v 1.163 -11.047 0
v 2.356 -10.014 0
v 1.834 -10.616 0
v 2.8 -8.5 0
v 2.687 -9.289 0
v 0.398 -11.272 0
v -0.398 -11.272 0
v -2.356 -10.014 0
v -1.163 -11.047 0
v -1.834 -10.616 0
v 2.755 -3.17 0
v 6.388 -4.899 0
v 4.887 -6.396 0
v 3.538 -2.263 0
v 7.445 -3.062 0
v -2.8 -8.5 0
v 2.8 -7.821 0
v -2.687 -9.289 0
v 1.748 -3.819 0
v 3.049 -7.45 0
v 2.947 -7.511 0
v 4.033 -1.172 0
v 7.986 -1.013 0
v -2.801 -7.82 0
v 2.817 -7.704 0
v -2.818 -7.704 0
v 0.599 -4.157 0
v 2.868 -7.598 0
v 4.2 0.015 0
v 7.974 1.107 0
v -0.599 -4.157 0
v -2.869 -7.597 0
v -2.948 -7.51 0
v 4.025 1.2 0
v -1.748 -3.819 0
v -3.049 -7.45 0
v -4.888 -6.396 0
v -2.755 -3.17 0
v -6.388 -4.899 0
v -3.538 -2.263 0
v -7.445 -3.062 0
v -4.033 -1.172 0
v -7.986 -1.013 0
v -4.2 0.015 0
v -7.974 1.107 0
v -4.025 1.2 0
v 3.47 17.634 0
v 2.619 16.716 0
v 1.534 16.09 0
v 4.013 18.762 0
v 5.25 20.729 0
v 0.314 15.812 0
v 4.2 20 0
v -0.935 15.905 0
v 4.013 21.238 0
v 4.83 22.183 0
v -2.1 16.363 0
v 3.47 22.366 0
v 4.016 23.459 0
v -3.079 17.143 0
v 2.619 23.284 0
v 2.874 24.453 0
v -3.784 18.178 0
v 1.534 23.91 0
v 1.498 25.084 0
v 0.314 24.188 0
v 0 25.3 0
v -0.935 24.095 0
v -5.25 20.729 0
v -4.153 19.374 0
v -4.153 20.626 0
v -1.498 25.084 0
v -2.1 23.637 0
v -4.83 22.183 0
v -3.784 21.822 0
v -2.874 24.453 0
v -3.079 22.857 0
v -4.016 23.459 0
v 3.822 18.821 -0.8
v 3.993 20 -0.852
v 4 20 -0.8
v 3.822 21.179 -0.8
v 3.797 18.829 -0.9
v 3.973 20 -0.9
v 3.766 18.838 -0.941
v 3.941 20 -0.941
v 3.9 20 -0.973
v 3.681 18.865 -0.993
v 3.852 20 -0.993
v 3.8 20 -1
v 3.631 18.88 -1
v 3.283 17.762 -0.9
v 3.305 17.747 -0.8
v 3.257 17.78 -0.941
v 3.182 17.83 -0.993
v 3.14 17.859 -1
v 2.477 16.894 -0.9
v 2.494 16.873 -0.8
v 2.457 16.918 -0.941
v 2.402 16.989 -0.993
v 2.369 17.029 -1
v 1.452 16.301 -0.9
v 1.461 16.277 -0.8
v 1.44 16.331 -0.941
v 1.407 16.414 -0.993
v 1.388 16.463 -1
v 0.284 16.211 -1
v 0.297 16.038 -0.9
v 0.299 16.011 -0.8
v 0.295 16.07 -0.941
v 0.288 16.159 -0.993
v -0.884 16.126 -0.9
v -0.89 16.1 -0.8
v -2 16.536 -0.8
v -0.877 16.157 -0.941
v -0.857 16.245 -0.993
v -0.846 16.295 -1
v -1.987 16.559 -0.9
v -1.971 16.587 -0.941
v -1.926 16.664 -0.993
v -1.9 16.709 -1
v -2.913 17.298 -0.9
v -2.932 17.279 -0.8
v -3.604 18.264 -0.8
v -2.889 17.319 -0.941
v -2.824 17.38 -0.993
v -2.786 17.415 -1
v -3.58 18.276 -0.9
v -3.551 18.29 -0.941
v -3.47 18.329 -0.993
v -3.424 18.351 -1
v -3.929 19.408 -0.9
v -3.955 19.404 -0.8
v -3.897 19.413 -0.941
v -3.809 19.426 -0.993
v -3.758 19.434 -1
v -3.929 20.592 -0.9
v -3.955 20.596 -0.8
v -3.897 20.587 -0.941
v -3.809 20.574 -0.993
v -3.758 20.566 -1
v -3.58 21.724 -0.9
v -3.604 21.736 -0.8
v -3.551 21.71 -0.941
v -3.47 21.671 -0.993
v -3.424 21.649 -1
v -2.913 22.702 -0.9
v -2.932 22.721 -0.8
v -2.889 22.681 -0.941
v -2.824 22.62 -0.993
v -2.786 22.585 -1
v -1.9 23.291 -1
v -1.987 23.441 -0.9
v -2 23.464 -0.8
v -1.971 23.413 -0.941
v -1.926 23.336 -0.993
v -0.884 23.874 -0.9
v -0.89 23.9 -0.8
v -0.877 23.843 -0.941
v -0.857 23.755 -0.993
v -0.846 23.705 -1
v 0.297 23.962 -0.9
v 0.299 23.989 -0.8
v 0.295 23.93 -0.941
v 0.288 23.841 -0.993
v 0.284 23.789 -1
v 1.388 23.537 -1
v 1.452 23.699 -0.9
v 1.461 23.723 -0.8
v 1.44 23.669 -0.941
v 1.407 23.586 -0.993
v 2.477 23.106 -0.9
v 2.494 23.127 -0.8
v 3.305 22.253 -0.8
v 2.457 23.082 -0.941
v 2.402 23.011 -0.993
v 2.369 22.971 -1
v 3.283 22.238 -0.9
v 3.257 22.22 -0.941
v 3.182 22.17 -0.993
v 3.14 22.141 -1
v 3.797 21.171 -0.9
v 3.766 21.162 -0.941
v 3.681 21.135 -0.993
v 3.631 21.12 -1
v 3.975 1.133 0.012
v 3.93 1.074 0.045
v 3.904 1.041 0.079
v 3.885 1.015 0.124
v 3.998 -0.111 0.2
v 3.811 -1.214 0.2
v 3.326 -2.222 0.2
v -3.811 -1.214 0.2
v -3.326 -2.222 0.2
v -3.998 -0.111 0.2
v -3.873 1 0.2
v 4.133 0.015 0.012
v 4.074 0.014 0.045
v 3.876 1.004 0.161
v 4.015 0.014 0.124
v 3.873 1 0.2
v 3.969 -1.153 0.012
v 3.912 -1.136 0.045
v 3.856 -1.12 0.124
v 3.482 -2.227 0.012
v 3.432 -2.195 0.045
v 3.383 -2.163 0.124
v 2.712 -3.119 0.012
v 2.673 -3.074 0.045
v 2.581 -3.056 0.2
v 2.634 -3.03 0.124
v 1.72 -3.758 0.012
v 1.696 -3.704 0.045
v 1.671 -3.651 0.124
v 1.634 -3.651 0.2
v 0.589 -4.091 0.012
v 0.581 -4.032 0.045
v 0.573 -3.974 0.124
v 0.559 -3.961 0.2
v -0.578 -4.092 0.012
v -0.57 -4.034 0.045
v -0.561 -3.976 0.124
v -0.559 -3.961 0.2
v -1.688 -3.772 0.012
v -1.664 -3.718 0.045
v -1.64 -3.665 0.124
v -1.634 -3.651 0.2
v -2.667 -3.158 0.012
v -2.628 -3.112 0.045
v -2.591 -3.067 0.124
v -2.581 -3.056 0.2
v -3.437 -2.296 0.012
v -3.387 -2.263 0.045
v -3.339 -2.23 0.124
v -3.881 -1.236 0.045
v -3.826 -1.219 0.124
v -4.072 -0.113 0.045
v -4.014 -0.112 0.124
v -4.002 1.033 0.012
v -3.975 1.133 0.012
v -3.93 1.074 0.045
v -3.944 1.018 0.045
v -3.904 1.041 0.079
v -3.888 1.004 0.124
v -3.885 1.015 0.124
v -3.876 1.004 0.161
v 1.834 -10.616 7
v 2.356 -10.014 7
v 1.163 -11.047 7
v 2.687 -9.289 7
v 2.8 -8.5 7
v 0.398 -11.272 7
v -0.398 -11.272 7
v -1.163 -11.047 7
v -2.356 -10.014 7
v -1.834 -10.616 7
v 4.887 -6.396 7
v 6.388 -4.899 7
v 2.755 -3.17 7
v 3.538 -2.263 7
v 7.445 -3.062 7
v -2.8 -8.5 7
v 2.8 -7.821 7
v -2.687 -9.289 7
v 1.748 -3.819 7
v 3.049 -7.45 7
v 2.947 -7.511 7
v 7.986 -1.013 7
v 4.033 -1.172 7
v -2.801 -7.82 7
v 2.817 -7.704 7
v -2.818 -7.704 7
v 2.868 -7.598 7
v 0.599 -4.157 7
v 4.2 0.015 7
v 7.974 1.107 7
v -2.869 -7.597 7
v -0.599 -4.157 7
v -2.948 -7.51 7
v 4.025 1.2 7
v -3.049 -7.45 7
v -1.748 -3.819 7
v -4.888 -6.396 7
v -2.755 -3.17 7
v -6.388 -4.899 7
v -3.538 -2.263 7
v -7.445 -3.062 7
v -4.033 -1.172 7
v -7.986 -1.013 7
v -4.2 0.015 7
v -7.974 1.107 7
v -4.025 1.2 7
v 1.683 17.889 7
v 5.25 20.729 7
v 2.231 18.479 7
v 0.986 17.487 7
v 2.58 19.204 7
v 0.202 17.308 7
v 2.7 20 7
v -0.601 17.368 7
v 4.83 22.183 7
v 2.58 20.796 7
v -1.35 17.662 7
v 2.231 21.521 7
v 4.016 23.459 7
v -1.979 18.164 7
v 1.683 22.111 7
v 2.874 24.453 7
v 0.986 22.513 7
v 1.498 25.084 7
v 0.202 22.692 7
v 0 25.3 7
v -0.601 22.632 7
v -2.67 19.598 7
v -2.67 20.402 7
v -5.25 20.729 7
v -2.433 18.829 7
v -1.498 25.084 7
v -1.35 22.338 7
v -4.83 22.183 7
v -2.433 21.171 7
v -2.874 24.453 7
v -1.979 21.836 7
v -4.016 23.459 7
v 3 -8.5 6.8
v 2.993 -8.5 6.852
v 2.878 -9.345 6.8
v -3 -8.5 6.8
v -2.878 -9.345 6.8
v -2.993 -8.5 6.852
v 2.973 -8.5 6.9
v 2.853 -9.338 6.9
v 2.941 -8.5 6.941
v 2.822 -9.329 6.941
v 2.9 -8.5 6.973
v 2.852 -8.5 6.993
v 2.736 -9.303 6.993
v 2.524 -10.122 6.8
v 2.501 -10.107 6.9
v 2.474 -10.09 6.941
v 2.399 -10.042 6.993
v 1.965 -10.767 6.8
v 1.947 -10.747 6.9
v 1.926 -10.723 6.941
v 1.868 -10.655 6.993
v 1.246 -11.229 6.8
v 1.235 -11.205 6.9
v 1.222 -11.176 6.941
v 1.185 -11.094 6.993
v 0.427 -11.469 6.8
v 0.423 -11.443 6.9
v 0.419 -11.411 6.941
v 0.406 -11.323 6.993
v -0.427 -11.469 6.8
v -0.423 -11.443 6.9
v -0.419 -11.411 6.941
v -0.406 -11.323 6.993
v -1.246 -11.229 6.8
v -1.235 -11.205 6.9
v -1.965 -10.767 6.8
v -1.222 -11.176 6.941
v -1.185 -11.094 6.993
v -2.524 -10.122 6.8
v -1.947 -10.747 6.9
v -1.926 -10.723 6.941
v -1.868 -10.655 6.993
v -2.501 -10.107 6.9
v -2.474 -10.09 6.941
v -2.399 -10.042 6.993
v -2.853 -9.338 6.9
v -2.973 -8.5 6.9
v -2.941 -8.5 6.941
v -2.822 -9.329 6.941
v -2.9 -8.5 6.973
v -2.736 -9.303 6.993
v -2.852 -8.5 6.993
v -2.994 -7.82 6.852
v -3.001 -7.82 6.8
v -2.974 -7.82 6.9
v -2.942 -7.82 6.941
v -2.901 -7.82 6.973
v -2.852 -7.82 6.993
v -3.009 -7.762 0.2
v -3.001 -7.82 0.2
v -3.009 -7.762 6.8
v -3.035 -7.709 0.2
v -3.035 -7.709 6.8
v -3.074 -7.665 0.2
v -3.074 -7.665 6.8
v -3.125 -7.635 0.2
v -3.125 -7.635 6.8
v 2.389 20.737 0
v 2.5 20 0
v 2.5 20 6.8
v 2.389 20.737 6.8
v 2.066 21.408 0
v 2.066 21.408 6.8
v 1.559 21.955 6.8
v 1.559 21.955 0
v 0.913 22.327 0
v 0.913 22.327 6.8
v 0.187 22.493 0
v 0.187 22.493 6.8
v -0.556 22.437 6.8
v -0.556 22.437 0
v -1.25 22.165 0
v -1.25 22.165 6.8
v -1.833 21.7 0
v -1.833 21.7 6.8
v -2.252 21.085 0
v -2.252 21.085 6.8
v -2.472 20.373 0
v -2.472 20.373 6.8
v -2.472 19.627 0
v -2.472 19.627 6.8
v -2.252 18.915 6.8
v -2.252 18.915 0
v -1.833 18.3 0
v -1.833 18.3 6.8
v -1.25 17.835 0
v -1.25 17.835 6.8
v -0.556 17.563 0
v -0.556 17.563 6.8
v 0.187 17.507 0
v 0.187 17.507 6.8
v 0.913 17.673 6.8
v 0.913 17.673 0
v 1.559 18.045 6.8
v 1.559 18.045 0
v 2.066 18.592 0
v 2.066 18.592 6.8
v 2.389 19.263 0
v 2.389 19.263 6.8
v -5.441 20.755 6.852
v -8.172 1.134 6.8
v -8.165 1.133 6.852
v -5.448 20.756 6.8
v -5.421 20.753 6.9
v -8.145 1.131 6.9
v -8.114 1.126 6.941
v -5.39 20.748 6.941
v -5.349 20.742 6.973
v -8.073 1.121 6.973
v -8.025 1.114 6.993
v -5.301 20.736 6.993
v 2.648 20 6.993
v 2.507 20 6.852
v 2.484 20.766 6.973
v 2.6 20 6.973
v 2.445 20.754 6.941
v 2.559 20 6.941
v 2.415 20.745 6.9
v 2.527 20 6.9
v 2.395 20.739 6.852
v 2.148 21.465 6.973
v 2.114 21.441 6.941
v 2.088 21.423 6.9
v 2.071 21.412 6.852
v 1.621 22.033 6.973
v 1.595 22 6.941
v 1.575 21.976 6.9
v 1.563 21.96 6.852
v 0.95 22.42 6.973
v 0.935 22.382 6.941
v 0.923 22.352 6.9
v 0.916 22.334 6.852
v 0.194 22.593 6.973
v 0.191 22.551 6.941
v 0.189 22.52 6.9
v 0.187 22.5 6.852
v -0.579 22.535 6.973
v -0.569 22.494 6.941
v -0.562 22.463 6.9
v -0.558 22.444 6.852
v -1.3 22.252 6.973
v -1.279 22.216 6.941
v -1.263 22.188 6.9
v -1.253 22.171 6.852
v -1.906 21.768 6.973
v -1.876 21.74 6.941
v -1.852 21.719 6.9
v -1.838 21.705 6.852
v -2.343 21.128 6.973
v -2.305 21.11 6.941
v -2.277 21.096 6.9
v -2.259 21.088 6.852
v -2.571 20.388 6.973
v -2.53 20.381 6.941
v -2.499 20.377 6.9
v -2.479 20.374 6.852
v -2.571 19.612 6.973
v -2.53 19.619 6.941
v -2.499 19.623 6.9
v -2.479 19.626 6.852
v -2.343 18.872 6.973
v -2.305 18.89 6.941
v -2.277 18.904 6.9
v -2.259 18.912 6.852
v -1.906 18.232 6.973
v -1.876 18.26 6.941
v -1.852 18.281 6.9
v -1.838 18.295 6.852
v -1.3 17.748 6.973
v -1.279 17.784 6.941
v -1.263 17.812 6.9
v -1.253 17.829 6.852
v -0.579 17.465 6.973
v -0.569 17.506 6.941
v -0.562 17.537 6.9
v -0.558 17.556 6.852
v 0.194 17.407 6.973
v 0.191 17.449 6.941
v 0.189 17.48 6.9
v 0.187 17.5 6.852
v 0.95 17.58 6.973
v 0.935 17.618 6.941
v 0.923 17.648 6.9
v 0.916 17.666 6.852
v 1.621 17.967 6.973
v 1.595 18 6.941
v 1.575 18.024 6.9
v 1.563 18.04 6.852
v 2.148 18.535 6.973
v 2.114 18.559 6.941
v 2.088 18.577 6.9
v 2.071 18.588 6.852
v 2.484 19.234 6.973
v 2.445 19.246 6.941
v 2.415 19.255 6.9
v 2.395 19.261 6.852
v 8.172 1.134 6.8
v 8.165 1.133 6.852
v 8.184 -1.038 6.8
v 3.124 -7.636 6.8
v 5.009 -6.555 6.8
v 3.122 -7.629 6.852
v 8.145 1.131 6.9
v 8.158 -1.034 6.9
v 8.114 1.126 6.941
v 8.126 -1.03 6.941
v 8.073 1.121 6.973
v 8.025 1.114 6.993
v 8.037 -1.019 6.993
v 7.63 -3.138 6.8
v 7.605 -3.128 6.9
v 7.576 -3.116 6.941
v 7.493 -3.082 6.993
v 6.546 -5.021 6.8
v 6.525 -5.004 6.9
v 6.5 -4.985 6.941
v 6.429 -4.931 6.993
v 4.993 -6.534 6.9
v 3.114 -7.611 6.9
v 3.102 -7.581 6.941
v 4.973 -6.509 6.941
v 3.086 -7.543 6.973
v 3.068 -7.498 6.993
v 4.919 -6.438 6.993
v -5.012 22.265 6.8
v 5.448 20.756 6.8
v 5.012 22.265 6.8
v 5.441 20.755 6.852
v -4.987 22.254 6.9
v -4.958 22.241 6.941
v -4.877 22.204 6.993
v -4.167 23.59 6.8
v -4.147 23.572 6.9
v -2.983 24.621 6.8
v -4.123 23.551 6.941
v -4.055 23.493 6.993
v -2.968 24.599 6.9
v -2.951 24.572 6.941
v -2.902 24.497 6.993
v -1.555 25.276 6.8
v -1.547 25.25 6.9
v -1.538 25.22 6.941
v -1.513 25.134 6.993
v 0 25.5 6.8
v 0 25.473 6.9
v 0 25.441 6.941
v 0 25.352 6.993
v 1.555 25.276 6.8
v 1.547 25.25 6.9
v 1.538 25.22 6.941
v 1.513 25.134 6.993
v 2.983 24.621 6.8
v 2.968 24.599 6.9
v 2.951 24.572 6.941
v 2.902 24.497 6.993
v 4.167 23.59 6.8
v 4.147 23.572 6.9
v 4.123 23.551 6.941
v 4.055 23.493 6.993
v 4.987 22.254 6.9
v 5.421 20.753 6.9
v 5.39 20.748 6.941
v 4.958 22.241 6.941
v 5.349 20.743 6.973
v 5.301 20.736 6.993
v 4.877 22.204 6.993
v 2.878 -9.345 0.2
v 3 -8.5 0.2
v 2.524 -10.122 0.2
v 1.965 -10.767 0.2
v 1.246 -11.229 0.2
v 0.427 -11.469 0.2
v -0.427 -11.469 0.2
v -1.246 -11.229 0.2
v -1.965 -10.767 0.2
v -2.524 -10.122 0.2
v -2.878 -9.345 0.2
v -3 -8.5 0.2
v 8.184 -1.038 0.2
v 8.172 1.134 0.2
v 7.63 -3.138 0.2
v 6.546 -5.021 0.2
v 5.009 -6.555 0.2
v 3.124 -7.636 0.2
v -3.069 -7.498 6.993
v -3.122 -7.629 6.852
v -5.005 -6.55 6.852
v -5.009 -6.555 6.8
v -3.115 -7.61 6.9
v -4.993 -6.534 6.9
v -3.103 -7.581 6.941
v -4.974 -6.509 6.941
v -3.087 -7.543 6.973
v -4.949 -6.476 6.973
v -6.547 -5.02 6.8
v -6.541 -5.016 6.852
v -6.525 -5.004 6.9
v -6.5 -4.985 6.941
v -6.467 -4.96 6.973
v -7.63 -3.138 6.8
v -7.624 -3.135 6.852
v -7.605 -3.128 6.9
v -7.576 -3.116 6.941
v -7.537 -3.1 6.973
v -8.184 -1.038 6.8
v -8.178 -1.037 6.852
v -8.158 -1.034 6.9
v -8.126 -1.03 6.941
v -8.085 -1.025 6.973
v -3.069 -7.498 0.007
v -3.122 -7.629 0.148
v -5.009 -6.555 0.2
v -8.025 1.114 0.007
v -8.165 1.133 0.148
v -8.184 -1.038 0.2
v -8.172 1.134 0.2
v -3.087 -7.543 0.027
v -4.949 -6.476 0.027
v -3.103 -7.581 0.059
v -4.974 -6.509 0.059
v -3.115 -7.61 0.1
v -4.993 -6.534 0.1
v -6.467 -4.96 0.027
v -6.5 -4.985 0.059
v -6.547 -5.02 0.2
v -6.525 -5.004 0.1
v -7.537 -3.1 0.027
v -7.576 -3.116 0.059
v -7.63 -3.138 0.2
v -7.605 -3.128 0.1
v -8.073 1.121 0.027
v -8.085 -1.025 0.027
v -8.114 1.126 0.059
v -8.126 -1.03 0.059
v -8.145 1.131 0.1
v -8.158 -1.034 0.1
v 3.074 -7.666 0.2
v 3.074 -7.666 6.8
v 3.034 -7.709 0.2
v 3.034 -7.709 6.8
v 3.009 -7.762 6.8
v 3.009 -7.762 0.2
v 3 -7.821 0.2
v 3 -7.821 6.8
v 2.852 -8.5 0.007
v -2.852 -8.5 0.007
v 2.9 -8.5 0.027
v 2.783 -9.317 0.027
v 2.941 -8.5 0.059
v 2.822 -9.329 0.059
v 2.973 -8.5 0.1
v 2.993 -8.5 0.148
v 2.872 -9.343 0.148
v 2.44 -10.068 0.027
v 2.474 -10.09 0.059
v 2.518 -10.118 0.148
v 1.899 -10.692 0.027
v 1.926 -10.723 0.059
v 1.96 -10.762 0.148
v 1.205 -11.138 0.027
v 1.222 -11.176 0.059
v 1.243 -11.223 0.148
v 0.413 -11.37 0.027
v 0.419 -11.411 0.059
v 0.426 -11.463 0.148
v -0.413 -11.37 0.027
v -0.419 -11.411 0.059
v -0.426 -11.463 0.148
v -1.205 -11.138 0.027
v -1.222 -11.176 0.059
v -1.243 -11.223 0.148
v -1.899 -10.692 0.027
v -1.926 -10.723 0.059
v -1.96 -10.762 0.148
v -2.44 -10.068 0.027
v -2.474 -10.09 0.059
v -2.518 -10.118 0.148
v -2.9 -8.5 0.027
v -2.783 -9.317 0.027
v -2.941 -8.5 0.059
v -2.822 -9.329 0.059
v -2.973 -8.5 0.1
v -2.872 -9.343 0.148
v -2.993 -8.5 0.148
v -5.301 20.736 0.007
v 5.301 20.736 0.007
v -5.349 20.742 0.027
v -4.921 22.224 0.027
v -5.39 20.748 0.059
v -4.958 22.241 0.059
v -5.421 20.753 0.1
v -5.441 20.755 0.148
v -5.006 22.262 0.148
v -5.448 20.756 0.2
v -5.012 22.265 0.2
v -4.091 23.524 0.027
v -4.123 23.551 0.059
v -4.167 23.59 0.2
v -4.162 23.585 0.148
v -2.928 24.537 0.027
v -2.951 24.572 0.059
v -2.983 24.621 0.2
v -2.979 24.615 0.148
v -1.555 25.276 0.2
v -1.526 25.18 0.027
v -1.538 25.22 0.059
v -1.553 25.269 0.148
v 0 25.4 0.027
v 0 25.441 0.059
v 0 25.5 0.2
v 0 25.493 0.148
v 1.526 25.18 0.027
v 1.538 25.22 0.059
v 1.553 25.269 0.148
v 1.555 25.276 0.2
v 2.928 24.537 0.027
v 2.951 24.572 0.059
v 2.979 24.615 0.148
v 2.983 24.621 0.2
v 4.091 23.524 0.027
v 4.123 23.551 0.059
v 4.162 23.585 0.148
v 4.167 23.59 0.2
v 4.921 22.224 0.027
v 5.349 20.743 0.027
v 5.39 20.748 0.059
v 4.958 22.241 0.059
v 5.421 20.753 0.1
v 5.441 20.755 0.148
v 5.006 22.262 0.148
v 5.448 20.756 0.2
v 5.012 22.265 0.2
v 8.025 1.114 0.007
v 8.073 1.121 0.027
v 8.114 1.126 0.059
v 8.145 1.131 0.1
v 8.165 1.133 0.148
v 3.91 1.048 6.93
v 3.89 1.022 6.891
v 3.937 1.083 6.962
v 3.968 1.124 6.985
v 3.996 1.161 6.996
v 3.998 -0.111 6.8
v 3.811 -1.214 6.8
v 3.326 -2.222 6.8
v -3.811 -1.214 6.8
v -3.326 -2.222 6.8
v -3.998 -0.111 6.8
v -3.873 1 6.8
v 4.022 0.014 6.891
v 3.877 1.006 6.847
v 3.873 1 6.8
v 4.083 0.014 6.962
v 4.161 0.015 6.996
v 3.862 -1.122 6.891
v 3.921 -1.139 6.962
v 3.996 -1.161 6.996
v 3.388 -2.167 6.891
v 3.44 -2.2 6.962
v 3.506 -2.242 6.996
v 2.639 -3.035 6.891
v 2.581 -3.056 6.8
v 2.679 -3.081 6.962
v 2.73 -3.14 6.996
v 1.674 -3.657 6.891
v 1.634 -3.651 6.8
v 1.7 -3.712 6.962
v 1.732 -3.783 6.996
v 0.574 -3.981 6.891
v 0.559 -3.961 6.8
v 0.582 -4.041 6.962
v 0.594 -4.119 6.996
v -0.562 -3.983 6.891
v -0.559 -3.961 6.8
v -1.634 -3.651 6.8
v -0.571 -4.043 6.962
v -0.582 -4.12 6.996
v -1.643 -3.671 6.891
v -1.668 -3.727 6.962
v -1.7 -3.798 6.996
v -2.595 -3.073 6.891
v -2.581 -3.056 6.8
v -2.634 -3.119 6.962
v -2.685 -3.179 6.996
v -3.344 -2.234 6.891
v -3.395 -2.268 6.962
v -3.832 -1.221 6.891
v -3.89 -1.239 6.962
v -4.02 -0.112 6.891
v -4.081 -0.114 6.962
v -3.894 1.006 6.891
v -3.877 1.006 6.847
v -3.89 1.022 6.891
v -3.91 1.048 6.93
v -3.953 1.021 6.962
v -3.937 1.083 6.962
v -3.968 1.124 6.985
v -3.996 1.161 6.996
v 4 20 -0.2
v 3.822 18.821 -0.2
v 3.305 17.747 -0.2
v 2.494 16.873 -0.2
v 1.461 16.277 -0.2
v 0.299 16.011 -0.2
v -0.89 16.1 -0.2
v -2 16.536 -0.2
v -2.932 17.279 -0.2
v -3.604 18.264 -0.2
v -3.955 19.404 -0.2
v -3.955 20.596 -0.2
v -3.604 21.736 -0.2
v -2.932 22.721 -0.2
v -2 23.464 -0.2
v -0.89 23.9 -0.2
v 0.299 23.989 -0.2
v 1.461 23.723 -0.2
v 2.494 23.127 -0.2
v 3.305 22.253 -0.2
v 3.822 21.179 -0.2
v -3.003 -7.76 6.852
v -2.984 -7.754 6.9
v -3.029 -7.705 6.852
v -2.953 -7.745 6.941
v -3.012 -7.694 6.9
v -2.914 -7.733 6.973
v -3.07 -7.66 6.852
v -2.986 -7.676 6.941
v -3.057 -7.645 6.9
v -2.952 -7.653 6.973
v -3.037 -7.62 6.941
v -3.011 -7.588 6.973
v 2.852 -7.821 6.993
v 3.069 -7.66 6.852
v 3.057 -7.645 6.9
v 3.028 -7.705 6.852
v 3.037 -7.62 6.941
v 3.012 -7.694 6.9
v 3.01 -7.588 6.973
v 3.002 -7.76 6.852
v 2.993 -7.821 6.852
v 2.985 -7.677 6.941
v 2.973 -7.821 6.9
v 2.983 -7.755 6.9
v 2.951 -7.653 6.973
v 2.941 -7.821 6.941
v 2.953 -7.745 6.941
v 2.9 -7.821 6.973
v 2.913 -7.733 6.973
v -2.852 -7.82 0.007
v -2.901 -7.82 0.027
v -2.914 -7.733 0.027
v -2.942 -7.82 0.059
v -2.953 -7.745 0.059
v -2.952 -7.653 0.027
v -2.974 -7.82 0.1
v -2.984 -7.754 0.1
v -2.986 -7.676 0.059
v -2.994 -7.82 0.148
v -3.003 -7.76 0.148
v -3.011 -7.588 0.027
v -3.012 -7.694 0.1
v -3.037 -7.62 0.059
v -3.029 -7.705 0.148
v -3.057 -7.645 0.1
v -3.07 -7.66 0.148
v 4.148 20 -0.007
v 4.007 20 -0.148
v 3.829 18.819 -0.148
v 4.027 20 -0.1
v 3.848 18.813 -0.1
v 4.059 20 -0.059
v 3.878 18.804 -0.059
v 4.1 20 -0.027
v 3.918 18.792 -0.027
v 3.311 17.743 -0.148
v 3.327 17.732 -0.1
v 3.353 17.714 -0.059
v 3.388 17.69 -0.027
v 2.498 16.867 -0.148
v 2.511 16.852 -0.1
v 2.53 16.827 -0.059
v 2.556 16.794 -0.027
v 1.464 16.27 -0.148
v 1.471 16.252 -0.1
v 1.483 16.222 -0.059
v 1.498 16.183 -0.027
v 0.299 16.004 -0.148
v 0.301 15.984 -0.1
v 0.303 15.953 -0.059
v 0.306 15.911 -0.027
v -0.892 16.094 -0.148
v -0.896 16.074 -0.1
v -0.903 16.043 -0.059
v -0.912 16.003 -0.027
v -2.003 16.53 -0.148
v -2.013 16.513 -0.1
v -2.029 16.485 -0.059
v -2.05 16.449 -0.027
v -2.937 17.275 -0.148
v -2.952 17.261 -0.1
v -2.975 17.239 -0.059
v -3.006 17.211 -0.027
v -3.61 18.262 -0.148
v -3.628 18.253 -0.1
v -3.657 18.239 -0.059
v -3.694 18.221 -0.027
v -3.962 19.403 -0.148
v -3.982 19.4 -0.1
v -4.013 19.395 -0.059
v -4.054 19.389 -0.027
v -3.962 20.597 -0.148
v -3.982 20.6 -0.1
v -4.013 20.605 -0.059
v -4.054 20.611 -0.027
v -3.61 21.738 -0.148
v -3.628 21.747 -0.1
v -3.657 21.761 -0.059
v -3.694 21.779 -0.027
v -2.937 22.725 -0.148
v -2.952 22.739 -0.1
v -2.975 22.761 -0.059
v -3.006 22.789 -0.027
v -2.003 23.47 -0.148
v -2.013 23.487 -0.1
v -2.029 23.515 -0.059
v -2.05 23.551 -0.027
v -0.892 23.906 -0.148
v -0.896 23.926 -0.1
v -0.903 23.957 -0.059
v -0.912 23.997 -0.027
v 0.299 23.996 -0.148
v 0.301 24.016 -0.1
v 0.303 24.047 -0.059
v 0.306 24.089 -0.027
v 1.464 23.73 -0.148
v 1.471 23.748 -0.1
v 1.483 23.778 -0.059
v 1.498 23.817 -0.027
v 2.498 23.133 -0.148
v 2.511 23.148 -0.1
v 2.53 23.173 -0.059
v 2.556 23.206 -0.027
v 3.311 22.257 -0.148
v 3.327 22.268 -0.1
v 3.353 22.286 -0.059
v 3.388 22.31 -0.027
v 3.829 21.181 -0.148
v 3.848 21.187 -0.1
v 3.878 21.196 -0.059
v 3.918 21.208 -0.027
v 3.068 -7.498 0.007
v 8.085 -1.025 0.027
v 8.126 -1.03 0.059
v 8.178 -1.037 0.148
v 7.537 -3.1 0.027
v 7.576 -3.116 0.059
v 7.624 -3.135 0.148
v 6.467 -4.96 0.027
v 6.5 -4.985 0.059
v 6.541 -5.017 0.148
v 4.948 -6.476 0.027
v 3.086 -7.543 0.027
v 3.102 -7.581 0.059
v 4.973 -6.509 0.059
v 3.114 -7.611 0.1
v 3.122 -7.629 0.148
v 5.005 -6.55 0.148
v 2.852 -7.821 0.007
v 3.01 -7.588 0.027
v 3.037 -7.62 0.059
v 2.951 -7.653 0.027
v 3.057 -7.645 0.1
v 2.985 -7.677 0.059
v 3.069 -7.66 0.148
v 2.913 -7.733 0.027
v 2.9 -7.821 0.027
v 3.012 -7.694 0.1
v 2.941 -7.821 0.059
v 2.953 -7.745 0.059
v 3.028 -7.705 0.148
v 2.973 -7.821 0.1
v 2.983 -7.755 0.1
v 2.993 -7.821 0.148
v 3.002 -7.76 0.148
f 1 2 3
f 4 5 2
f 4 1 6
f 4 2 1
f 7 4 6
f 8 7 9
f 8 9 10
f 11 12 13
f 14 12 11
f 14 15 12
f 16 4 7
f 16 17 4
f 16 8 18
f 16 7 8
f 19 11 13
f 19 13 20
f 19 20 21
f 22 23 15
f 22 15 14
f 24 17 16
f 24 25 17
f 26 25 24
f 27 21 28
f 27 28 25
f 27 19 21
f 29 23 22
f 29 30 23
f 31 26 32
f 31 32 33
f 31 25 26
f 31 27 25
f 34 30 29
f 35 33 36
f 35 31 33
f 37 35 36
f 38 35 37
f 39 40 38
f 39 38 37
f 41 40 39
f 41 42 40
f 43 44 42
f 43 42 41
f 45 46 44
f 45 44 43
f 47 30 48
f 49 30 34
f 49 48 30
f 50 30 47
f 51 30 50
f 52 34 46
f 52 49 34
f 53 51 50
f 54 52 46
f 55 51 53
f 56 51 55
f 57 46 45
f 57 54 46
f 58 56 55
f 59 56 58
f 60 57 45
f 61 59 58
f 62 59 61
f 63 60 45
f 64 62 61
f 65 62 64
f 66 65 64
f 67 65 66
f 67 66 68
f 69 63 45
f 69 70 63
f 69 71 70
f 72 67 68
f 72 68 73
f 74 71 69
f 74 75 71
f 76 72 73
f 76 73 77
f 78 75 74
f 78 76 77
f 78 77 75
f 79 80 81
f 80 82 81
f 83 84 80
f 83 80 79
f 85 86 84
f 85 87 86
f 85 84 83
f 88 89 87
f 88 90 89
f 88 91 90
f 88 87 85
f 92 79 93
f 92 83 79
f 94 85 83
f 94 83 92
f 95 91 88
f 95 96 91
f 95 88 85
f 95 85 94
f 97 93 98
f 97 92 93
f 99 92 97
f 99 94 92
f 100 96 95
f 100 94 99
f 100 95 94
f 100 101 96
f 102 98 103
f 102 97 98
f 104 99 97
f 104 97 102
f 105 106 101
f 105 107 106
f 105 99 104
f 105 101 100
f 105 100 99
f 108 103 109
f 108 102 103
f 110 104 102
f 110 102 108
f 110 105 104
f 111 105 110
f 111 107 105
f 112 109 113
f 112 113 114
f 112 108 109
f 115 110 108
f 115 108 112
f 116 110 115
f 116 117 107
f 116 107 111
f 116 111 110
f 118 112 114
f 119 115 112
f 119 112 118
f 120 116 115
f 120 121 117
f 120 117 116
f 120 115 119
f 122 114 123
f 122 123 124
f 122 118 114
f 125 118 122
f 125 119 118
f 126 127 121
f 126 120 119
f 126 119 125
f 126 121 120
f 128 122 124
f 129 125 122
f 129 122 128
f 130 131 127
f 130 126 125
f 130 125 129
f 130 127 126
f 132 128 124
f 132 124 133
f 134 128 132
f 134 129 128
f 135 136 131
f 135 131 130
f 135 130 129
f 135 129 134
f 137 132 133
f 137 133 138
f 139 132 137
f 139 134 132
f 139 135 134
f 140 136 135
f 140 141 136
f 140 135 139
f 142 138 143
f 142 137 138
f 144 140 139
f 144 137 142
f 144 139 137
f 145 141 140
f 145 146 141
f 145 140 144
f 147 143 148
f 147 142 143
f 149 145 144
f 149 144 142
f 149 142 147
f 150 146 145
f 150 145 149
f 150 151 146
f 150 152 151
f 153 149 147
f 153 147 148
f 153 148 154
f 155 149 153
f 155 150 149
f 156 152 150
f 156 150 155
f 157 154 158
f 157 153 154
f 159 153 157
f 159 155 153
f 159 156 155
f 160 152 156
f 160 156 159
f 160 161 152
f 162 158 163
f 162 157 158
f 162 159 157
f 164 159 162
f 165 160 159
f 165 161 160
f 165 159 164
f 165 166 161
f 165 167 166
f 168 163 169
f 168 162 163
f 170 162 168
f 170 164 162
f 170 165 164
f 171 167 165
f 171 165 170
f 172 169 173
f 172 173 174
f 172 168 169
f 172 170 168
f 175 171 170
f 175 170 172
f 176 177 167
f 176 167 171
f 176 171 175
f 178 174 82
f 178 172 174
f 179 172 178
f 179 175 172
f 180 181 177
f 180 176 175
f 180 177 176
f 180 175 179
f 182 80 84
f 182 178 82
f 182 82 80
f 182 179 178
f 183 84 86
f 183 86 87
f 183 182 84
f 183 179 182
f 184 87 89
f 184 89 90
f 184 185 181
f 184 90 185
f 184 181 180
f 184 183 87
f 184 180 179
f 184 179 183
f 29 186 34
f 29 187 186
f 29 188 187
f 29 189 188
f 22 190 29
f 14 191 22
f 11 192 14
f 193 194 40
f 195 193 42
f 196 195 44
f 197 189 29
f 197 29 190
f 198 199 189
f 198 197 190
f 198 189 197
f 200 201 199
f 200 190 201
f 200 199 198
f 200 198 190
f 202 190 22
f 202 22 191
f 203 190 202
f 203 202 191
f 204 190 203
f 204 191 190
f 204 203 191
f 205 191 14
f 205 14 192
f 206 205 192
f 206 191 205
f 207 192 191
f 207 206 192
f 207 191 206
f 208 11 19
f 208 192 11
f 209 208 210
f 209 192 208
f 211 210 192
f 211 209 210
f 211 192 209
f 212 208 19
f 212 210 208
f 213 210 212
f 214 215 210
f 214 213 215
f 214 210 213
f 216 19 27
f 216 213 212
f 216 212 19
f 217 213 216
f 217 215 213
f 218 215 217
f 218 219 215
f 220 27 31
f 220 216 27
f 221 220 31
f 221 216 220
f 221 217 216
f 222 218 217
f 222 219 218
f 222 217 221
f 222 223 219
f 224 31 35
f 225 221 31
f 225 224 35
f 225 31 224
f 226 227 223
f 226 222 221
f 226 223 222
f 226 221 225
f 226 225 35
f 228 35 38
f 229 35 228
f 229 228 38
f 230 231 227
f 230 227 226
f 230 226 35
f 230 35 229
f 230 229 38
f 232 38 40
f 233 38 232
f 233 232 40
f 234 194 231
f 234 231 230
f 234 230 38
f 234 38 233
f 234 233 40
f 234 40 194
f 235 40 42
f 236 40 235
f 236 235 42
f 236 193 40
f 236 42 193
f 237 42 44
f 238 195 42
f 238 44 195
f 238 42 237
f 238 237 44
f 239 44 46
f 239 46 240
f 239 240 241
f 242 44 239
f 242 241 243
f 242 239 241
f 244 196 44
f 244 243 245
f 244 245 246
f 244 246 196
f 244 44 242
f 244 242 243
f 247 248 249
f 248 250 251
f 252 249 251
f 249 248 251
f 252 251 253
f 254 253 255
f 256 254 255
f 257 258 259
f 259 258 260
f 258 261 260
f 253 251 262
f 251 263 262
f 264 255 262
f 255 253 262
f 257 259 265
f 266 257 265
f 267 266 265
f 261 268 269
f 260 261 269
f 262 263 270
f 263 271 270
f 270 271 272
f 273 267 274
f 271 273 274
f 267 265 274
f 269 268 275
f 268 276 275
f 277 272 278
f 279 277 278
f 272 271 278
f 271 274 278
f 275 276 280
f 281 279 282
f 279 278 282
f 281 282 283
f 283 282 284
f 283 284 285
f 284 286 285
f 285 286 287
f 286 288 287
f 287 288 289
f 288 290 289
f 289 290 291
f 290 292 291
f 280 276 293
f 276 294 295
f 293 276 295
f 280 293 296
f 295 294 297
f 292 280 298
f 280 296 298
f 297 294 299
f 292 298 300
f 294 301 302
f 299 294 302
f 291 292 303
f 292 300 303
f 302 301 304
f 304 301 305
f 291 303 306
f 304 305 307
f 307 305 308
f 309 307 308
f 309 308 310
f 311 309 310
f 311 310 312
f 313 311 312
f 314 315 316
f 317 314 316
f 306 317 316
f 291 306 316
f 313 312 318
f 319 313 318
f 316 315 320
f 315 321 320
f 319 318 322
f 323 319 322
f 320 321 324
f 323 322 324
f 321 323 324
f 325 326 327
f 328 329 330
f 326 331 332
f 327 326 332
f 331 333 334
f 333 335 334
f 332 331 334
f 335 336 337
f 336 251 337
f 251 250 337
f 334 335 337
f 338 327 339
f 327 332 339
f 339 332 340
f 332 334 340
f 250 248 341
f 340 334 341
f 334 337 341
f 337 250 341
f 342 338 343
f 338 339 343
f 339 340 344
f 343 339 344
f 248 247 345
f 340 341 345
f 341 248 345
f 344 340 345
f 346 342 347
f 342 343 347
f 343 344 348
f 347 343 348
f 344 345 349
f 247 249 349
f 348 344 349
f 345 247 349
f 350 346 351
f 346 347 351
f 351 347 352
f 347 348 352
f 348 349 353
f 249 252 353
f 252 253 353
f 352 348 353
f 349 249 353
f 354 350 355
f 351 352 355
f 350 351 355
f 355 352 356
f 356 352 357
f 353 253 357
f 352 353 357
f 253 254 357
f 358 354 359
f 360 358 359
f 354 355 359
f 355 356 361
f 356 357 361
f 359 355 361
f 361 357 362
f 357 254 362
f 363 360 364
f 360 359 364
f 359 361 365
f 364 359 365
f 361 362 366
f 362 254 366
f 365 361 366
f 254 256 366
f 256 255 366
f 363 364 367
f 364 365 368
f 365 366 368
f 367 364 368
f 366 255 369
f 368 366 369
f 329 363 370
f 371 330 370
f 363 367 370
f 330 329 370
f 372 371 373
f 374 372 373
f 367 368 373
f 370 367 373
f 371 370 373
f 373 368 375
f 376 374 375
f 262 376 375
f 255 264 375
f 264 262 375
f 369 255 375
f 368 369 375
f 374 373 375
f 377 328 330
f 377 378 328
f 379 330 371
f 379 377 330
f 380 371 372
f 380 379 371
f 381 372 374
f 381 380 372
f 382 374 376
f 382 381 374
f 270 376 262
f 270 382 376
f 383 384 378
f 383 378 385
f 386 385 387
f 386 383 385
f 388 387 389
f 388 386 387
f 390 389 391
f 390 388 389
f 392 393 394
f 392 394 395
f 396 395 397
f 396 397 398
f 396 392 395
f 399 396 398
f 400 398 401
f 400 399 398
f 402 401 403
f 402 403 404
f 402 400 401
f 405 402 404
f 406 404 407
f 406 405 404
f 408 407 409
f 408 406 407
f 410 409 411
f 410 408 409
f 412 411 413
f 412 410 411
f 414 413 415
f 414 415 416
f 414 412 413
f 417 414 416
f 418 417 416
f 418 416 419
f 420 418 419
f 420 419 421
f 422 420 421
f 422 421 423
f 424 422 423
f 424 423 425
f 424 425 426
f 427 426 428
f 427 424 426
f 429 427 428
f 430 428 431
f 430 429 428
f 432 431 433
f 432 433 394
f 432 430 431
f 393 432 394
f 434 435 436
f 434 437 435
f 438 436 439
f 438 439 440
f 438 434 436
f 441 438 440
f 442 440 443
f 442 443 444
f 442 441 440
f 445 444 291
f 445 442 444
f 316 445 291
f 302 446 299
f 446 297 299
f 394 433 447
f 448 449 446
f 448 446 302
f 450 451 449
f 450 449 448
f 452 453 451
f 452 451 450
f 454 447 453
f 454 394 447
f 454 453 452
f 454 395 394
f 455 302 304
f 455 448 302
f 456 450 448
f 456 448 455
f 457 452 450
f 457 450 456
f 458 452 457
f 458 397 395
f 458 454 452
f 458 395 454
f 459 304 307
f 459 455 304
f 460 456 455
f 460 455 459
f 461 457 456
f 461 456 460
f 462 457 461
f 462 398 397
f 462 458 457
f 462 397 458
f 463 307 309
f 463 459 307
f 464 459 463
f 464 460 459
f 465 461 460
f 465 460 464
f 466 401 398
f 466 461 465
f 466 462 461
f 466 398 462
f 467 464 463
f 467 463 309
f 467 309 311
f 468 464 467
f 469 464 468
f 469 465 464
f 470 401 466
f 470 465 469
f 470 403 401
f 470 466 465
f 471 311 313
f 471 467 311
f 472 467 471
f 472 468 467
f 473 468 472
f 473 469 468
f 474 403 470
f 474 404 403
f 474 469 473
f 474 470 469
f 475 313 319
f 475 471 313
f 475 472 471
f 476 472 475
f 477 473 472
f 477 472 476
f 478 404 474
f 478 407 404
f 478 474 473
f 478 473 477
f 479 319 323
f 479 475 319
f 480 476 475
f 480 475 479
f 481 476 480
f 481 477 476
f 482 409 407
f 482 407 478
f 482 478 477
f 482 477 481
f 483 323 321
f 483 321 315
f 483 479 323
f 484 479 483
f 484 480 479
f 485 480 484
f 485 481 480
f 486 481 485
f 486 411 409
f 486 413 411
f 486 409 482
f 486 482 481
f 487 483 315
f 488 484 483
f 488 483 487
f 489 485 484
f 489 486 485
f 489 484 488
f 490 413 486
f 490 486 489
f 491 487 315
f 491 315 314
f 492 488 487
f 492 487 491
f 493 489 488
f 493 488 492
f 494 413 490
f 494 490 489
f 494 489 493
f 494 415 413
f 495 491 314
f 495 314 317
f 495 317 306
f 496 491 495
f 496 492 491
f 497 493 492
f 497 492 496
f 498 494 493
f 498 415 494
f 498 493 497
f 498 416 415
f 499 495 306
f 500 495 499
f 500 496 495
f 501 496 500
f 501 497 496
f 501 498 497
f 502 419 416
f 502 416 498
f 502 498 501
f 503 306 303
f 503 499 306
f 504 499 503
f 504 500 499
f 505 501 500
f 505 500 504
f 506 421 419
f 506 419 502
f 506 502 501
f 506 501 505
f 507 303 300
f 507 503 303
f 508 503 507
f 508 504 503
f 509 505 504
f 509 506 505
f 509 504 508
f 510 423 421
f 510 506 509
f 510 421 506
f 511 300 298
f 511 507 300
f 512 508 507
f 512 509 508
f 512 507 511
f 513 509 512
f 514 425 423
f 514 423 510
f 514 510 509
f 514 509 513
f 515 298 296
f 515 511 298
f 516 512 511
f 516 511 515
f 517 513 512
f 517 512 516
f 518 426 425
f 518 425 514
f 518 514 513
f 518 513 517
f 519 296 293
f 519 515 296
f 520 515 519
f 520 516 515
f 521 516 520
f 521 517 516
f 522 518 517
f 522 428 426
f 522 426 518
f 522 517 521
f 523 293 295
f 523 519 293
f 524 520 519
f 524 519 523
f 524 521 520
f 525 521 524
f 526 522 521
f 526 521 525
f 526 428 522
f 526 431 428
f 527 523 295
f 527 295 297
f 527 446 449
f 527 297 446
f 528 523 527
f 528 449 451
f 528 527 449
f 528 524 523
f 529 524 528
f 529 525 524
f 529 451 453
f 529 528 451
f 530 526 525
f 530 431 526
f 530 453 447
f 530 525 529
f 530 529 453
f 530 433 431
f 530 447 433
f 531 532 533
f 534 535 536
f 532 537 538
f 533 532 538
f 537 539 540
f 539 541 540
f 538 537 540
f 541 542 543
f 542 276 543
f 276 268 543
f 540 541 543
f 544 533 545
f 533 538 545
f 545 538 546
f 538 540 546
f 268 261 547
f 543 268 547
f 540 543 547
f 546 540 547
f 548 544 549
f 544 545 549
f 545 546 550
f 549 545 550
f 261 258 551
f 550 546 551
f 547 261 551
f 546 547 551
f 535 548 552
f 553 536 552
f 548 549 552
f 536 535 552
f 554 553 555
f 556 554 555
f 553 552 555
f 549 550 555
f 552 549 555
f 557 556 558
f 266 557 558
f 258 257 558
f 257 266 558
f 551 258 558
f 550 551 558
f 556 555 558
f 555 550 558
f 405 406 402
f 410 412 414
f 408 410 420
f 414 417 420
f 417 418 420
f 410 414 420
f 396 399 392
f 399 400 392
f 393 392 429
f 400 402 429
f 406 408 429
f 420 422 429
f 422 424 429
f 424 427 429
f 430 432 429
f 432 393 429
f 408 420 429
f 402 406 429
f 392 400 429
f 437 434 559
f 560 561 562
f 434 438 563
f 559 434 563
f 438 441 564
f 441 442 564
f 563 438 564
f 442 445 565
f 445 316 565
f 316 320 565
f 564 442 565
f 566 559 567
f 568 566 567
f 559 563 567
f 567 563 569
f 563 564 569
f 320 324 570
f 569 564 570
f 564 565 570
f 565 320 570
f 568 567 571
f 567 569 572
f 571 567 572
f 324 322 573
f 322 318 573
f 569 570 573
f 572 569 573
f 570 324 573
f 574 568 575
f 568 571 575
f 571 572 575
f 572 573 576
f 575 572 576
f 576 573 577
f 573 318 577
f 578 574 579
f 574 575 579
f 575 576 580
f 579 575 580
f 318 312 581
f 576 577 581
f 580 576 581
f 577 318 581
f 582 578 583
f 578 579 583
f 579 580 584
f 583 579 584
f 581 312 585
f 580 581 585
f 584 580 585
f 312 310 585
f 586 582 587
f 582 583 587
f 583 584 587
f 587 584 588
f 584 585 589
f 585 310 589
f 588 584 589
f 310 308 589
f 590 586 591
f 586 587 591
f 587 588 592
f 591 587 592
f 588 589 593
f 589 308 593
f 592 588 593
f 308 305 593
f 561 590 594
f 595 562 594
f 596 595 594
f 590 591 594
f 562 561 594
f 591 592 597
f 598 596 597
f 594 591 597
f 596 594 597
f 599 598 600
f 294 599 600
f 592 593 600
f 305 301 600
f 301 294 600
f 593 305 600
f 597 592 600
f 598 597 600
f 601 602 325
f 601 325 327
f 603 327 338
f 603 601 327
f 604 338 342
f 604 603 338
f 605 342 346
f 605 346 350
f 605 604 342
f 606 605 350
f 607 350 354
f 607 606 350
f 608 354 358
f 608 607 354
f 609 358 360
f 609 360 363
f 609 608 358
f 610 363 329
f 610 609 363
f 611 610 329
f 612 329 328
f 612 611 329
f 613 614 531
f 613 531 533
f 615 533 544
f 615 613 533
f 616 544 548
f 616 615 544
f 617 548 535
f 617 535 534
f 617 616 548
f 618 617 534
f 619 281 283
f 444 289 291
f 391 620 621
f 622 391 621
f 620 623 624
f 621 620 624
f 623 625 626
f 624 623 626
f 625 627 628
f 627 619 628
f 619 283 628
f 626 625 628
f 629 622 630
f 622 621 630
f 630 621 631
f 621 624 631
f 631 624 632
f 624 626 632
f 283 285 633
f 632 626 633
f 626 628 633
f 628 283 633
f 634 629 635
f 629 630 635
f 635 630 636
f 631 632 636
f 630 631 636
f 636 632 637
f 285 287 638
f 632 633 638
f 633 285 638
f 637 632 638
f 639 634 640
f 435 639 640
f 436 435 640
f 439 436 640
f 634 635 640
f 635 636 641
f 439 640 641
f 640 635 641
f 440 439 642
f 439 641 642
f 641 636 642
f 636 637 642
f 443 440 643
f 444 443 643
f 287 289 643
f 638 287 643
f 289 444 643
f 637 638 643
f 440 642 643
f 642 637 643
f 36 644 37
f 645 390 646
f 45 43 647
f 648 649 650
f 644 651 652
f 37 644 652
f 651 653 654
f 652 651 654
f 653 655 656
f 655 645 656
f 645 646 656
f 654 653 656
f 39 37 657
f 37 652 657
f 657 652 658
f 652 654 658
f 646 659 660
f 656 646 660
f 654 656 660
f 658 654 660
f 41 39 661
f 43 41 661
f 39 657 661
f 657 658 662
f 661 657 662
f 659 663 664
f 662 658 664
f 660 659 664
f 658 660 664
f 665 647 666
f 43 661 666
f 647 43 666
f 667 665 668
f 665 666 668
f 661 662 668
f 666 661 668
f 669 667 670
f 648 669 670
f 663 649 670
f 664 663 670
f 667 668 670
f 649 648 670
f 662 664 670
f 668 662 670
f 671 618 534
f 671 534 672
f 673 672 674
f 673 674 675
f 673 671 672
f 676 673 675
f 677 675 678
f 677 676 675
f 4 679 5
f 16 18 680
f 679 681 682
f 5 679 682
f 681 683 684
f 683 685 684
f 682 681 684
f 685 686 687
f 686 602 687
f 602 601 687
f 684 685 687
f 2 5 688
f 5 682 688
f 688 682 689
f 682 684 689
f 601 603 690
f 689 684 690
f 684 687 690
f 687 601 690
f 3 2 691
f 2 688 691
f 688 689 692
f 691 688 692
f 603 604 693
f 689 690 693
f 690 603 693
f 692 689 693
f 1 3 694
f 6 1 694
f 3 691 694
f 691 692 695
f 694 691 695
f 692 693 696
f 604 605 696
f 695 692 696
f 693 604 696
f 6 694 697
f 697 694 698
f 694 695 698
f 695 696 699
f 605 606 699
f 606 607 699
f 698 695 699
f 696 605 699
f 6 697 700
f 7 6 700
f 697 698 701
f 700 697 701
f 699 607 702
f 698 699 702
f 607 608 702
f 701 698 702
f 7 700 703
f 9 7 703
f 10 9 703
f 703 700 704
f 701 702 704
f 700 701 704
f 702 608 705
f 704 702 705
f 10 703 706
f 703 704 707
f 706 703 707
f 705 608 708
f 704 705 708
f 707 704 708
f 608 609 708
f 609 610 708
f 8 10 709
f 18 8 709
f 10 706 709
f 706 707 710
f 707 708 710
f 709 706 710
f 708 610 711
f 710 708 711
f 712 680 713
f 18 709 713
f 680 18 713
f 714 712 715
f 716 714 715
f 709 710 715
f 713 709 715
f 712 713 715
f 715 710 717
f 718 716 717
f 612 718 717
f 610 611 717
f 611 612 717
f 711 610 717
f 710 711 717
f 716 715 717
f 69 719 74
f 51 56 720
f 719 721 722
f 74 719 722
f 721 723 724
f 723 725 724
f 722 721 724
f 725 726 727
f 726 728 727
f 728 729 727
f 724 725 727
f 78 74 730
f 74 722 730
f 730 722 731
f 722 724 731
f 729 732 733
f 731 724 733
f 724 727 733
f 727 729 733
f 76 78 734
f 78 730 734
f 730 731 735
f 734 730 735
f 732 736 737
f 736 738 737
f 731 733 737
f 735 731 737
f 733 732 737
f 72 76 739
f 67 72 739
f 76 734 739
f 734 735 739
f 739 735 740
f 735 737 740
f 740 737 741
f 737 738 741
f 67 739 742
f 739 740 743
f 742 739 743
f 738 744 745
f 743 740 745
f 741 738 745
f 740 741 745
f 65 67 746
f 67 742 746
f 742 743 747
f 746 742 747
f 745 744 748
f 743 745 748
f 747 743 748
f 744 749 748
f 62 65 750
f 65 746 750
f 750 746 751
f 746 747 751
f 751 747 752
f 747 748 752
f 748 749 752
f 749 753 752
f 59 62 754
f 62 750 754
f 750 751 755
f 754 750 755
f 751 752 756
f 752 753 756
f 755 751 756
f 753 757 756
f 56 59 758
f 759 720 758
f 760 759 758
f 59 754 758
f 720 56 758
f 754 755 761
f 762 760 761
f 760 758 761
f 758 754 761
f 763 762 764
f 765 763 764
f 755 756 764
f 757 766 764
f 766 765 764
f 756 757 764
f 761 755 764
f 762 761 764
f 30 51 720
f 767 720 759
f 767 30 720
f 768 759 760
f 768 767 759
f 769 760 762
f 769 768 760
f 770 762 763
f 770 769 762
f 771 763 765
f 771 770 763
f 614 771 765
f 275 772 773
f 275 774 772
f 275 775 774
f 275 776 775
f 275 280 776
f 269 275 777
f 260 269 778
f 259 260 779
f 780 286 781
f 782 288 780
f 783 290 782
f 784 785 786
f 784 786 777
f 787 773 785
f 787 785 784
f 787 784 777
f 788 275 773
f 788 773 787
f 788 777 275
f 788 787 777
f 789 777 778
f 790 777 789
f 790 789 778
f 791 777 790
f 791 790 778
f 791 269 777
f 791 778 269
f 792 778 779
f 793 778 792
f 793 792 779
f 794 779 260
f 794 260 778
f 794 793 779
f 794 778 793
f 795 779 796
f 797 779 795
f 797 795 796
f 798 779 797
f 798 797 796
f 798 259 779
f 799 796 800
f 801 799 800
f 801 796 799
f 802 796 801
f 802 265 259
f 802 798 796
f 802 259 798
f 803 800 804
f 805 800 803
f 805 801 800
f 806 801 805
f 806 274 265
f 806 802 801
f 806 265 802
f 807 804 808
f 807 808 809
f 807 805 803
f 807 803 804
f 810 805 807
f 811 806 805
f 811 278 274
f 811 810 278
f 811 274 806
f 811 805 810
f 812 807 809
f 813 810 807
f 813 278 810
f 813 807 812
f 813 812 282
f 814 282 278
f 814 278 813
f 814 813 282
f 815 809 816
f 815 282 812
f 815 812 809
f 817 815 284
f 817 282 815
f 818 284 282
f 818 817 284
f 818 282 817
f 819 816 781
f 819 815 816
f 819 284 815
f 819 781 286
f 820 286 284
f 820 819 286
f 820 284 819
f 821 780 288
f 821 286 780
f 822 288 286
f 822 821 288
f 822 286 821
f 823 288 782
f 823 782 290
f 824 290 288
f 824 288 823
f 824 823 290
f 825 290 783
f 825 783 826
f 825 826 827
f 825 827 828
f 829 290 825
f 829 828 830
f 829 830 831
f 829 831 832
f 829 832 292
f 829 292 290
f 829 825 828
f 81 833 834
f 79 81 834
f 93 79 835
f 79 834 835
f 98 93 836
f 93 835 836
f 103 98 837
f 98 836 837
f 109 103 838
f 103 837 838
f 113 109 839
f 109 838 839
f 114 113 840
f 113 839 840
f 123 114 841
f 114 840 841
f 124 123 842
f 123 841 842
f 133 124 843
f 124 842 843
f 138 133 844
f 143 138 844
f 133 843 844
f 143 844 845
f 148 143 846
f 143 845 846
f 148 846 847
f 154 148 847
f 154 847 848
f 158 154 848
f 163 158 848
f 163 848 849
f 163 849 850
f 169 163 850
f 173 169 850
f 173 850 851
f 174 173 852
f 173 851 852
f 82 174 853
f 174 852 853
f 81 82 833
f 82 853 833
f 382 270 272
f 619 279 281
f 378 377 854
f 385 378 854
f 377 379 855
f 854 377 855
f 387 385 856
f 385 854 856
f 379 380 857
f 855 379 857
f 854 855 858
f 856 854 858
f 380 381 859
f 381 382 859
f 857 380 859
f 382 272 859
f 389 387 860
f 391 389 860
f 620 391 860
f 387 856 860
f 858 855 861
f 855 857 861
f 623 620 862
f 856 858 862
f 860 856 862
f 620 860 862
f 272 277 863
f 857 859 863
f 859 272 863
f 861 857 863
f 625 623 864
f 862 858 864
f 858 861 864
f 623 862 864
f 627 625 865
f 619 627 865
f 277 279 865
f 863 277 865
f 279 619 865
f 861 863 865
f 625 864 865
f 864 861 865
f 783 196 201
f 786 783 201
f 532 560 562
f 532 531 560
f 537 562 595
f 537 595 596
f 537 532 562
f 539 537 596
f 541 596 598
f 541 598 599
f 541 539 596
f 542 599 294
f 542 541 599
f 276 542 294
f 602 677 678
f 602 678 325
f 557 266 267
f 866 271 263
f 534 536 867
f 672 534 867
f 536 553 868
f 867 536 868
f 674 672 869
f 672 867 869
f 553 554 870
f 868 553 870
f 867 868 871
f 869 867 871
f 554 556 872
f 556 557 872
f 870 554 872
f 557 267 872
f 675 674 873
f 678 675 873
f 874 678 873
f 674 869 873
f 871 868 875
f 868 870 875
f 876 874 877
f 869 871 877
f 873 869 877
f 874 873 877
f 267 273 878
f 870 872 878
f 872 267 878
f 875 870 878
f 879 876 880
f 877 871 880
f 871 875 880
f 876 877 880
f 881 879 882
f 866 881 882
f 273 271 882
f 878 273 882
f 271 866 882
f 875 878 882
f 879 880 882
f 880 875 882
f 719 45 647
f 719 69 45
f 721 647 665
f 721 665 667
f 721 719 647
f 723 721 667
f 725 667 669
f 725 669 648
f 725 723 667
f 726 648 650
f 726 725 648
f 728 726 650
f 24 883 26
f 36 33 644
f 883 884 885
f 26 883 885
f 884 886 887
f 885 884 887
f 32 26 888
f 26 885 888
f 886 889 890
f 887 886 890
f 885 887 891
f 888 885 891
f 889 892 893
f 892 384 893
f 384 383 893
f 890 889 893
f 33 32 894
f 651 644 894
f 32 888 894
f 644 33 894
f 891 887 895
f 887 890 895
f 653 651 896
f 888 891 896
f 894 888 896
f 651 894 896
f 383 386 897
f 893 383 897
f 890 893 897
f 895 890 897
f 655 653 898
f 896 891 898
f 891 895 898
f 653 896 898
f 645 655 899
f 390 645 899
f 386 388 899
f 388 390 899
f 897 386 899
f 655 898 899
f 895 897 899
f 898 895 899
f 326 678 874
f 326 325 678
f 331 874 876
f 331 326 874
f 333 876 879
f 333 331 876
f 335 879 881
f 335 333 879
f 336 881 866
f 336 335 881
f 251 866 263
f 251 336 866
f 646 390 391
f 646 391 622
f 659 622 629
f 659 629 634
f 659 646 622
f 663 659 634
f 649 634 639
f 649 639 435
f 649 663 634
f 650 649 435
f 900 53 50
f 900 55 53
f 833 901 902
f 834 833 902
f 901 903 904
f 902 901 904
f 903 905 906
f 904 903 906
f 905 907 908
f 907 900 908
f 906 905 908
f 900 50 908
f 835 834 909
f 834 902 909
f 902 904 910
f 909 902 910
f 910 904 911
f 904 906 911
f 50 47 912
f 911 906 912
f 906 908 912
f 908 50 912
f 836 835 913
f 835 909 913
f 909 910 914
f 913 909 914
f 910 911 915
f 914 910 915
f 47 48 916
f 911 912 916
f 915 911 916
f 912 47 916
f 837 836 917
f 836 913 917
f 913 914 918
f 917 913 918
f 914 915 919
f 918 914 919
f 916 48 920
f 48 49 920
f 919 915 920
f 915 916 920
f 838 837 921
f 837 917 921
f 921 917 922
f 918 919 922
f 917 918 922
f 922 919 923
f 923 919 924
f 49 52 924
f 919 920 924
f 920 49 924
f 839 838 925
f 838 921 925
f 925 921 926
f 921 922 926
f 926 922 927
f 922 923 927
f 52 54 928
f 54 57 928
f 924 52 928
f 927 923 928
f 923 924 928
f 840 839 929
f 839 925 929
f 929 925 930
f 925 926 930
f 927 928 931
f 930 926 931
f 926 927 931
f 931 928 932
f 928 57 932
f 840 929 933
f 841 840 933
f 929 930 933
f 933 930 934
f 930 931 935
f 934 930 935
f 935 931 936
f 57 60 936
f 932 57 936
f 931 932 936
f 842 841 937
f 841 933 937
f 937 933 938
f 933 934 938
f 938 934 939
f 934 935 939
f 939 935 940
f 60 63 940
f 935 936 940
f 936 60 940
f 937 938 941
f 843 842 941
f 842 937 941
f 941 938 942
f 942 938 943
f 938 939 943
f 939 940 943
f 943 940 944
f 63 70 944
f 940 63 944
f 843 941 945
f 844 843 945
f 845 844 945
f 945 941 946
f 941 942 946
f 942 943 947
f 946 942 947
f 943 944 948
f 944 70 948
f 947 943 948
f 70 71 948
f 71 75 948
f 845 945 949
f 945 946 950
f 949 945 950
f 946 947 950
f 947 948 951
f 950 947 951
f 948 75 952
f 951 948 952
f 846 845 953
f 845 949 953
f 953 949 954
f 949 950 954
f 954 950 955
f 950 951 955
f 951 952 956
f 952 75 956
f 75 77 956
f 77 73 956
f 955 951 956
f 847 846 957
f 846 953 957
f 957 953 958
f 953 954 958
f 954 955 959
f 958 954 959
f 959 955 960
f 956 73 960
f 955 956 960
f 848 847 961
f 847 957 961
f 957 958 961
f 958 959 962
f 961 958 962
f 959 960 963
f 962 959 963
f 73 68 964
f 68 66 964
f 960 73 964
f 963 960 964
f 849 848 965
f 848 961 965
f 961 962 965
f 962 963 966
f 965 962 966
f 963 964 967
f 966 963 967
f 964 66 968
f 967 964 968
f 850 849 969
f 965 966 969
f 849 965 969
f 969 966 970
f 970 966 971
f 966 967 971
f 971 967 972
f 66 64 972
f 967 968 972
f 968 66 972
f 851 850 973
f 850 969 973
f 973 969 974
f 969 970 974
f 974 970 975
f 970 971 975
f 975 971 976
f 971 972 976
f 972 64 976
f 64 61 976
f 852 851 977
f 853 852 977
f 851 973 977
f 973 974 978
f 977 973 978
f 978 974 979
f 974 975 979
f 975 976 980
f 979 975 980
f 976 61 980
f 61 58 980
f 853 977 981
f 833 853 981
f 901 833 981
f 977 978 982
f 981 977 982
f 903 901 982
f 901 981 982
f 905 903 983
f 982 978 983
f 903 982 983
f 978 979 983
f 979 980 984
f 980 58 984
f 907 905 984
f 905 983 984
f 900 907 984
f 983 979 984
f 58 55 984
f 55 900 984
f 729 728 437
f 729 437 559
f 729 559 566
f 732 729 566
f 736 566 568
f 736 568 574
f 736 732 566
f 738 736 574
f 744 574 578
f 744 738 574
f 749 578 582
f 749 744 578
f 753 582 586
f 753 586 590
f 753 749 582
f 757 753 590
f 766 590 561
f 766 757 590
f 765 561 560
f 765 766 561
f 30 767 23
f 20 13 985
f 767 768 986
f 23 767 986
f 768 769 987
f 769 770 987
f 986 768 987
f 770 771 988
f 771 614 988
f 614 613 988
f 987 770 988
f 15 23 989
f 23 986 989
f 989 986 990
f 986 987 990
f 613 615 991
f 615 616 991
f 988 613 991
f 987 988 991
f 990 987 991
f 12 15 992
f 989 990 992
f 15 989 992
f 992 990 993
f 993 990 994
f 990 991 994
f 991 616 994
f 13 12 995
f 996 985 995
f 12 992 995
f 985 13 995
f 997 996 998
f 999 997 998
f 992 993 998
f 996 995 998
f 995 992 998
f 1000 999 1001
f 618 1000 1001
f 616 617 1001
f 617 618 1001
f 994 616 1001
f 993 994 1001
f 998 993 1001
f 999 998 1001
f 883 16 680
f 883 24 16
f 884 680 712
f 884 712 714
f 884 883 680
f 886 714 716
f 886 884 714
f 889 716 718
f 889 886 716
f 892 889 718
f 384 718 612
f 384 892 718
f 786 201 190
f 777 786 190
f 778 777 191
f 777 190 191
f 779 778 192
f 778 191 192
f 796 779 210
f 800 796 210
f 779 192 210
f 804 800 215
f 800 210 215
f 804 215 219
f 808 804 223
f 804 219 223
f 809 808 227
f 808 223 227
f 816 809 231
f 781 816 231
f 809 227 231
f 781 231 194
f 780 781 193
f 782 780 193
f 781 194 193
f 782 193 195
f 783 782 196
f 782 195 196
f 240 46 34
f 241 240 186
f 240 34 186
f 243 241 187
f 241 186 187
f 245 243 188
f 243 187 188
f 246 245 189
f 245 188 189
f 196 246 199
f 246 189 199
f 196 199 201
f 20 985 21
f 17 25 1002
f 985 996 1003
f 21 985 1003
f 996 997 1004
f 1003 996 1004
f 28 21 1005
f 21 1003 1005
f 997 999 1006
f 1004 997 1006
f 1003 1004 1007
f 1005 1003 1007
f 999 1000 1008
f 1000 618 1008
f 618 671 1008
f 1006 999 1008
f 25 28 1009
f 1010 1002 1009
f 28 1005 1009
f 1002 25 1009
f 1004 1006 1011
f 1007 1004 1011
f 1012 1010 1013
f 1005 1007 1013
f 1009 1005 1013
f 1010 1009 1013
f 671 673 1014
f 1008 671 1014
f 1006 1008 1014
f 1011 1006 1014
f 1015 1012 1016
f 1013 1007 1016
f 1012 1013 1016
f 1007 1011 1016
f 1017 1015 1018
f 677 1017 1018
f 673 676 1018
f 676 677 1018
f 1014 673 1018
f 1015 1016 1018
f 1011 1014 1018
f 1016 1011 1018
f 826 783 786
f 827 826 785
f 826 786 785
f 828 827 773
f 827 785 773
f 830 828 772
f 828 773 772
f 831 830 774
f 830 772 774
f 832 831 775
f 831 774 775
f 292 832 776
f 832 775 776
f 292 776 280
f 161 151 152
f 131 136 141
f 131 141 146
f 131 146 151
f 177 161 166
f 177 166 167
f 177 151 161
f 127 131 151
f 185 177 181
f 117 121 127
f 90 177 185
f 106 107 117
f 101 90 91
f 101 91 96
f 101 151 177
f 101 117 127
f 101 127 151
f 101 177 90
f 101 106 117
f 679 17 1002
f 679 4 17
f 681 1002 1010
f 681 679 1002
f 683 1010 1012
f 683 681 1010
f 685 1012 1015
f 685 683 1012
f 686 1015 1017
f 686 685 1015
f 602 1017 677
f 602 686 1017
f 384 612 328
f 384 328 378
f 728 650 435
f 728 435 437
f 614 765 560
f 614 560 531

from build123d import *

# Parameters (mm, degrees)
ESQUISSE1_R      = 2.5
EXTRUSION1_DEPTH = 7
ESQUISSE2_R      = 4
EXTRUSION2_DEPTH = 1
CONG_1_R         = 0.2


with BuildPart() as part:
    # Esquisse1 → Extrusion1 (new body)
    with BuildSketch(Plane.XY):
        with BuildLine():
            Line((5.447759717, 20.75625), (8.171639576, 1.134375))
            ThreePointArc((8.171639576, 1.134375), (7.150328566, -4.115252289), (3.124260355, -7.635541712))
            ThreePointArc((3.124260355, -7.635541712), (3.033945899, -7.709173625), (3, -7.820645753))
            Line((3, -7.820645753), (3, -8.5))
            ThreePointArc((3, -8.5), (0, -11.5), (-3, -8.5))
            Line((-3, -8.5), (-3.000624069, -7.820206801))
            ThreePointArc((-3.000624069, -7.820206801), (-3.034616619, -7.708848691), (-3.124869571, -7.635292409))
            ThreePointArc((-3.124869571, -7.635292409), (-7.150492734, -4.11496703), (-8.171639576, 1.134375))
            Line((-8.171639576, 1.134375), (-5.447759717, 20.75625))
            ThreePointArc((-5.447759717, 20.75625), (0, 25.5), (5.447759717, 20.75625))
        make_face()
        with Locations((0, 20)):
            Circle(ESQUISSE1_R, mode=Mode.SUBTRACT)
        with BuildLine():
            Line((-3.872983346, 1), (3.872983346, 1))
            ThreePointArc((3.872983346, 1), (0, -4), (-3.872983346, 1))
        make_face(mode=Mode.SUBTRACT)
    extrude(amount=EXTRUSION1_DEPTH)

    # Esquisse2 → Extrusion2 (add)
    with BuildSketch(Plane(origin=(0, 0, 0), x_dir=(-1, 0, 0), z_dir=(0, 0, -1))):
        with Locations(Location((0, 20, 0), (0, 0, 180))):
            Circle(ESQUISSE2_R)
    extrude(amount=EXTRUSION2_DEPTH)

    # Congé1
    cong_1_edges = [part.edges().sort_by_distance(p)[0] for p in [
        (-6.809699647, 10.9453125, 0),
        (-6.809699647, 10.9453125, 7),
        (-7.150492734, -4.11496703, 0),
        (-7.150492734, -4.11496703, 7),
        (0, 25.5, 0),
        (0, 25.5, 7),
        (-3.034616619, -7.708848691, 0),
        (6.809699647, 10.9453125, 0),
        (-3.000312035, -8.1601034, 0),
        (7.150328566, -4.115252289, 0),
        (0, -11.5, 0),
        (3.033945899, -7.709173625, 0),
        (3, -8.160322877, 0),
        (0, -4, 0),
        (0, 1, 0),
        (-4, 20, 0),
        (6.809699647, 10.9453125, 7),
        (7.150328566, -4.115252289, 7),
        (3.033945899, -7.709173625, 7),
        (3, -8.160322877, 7),
        (0, -11.5, 7),
        (-3.000312035, -8.1601034, 7),
        (-3.034616619, -7.708848691, 7),
        (-2.5, 20, 7),
        (0, -4, 7),
        (0, 1, 7),
        (-4, 20, -1),
    ]]
    fillet(cong_1_edges, radius=CONG_1_R)


solid = part.part
